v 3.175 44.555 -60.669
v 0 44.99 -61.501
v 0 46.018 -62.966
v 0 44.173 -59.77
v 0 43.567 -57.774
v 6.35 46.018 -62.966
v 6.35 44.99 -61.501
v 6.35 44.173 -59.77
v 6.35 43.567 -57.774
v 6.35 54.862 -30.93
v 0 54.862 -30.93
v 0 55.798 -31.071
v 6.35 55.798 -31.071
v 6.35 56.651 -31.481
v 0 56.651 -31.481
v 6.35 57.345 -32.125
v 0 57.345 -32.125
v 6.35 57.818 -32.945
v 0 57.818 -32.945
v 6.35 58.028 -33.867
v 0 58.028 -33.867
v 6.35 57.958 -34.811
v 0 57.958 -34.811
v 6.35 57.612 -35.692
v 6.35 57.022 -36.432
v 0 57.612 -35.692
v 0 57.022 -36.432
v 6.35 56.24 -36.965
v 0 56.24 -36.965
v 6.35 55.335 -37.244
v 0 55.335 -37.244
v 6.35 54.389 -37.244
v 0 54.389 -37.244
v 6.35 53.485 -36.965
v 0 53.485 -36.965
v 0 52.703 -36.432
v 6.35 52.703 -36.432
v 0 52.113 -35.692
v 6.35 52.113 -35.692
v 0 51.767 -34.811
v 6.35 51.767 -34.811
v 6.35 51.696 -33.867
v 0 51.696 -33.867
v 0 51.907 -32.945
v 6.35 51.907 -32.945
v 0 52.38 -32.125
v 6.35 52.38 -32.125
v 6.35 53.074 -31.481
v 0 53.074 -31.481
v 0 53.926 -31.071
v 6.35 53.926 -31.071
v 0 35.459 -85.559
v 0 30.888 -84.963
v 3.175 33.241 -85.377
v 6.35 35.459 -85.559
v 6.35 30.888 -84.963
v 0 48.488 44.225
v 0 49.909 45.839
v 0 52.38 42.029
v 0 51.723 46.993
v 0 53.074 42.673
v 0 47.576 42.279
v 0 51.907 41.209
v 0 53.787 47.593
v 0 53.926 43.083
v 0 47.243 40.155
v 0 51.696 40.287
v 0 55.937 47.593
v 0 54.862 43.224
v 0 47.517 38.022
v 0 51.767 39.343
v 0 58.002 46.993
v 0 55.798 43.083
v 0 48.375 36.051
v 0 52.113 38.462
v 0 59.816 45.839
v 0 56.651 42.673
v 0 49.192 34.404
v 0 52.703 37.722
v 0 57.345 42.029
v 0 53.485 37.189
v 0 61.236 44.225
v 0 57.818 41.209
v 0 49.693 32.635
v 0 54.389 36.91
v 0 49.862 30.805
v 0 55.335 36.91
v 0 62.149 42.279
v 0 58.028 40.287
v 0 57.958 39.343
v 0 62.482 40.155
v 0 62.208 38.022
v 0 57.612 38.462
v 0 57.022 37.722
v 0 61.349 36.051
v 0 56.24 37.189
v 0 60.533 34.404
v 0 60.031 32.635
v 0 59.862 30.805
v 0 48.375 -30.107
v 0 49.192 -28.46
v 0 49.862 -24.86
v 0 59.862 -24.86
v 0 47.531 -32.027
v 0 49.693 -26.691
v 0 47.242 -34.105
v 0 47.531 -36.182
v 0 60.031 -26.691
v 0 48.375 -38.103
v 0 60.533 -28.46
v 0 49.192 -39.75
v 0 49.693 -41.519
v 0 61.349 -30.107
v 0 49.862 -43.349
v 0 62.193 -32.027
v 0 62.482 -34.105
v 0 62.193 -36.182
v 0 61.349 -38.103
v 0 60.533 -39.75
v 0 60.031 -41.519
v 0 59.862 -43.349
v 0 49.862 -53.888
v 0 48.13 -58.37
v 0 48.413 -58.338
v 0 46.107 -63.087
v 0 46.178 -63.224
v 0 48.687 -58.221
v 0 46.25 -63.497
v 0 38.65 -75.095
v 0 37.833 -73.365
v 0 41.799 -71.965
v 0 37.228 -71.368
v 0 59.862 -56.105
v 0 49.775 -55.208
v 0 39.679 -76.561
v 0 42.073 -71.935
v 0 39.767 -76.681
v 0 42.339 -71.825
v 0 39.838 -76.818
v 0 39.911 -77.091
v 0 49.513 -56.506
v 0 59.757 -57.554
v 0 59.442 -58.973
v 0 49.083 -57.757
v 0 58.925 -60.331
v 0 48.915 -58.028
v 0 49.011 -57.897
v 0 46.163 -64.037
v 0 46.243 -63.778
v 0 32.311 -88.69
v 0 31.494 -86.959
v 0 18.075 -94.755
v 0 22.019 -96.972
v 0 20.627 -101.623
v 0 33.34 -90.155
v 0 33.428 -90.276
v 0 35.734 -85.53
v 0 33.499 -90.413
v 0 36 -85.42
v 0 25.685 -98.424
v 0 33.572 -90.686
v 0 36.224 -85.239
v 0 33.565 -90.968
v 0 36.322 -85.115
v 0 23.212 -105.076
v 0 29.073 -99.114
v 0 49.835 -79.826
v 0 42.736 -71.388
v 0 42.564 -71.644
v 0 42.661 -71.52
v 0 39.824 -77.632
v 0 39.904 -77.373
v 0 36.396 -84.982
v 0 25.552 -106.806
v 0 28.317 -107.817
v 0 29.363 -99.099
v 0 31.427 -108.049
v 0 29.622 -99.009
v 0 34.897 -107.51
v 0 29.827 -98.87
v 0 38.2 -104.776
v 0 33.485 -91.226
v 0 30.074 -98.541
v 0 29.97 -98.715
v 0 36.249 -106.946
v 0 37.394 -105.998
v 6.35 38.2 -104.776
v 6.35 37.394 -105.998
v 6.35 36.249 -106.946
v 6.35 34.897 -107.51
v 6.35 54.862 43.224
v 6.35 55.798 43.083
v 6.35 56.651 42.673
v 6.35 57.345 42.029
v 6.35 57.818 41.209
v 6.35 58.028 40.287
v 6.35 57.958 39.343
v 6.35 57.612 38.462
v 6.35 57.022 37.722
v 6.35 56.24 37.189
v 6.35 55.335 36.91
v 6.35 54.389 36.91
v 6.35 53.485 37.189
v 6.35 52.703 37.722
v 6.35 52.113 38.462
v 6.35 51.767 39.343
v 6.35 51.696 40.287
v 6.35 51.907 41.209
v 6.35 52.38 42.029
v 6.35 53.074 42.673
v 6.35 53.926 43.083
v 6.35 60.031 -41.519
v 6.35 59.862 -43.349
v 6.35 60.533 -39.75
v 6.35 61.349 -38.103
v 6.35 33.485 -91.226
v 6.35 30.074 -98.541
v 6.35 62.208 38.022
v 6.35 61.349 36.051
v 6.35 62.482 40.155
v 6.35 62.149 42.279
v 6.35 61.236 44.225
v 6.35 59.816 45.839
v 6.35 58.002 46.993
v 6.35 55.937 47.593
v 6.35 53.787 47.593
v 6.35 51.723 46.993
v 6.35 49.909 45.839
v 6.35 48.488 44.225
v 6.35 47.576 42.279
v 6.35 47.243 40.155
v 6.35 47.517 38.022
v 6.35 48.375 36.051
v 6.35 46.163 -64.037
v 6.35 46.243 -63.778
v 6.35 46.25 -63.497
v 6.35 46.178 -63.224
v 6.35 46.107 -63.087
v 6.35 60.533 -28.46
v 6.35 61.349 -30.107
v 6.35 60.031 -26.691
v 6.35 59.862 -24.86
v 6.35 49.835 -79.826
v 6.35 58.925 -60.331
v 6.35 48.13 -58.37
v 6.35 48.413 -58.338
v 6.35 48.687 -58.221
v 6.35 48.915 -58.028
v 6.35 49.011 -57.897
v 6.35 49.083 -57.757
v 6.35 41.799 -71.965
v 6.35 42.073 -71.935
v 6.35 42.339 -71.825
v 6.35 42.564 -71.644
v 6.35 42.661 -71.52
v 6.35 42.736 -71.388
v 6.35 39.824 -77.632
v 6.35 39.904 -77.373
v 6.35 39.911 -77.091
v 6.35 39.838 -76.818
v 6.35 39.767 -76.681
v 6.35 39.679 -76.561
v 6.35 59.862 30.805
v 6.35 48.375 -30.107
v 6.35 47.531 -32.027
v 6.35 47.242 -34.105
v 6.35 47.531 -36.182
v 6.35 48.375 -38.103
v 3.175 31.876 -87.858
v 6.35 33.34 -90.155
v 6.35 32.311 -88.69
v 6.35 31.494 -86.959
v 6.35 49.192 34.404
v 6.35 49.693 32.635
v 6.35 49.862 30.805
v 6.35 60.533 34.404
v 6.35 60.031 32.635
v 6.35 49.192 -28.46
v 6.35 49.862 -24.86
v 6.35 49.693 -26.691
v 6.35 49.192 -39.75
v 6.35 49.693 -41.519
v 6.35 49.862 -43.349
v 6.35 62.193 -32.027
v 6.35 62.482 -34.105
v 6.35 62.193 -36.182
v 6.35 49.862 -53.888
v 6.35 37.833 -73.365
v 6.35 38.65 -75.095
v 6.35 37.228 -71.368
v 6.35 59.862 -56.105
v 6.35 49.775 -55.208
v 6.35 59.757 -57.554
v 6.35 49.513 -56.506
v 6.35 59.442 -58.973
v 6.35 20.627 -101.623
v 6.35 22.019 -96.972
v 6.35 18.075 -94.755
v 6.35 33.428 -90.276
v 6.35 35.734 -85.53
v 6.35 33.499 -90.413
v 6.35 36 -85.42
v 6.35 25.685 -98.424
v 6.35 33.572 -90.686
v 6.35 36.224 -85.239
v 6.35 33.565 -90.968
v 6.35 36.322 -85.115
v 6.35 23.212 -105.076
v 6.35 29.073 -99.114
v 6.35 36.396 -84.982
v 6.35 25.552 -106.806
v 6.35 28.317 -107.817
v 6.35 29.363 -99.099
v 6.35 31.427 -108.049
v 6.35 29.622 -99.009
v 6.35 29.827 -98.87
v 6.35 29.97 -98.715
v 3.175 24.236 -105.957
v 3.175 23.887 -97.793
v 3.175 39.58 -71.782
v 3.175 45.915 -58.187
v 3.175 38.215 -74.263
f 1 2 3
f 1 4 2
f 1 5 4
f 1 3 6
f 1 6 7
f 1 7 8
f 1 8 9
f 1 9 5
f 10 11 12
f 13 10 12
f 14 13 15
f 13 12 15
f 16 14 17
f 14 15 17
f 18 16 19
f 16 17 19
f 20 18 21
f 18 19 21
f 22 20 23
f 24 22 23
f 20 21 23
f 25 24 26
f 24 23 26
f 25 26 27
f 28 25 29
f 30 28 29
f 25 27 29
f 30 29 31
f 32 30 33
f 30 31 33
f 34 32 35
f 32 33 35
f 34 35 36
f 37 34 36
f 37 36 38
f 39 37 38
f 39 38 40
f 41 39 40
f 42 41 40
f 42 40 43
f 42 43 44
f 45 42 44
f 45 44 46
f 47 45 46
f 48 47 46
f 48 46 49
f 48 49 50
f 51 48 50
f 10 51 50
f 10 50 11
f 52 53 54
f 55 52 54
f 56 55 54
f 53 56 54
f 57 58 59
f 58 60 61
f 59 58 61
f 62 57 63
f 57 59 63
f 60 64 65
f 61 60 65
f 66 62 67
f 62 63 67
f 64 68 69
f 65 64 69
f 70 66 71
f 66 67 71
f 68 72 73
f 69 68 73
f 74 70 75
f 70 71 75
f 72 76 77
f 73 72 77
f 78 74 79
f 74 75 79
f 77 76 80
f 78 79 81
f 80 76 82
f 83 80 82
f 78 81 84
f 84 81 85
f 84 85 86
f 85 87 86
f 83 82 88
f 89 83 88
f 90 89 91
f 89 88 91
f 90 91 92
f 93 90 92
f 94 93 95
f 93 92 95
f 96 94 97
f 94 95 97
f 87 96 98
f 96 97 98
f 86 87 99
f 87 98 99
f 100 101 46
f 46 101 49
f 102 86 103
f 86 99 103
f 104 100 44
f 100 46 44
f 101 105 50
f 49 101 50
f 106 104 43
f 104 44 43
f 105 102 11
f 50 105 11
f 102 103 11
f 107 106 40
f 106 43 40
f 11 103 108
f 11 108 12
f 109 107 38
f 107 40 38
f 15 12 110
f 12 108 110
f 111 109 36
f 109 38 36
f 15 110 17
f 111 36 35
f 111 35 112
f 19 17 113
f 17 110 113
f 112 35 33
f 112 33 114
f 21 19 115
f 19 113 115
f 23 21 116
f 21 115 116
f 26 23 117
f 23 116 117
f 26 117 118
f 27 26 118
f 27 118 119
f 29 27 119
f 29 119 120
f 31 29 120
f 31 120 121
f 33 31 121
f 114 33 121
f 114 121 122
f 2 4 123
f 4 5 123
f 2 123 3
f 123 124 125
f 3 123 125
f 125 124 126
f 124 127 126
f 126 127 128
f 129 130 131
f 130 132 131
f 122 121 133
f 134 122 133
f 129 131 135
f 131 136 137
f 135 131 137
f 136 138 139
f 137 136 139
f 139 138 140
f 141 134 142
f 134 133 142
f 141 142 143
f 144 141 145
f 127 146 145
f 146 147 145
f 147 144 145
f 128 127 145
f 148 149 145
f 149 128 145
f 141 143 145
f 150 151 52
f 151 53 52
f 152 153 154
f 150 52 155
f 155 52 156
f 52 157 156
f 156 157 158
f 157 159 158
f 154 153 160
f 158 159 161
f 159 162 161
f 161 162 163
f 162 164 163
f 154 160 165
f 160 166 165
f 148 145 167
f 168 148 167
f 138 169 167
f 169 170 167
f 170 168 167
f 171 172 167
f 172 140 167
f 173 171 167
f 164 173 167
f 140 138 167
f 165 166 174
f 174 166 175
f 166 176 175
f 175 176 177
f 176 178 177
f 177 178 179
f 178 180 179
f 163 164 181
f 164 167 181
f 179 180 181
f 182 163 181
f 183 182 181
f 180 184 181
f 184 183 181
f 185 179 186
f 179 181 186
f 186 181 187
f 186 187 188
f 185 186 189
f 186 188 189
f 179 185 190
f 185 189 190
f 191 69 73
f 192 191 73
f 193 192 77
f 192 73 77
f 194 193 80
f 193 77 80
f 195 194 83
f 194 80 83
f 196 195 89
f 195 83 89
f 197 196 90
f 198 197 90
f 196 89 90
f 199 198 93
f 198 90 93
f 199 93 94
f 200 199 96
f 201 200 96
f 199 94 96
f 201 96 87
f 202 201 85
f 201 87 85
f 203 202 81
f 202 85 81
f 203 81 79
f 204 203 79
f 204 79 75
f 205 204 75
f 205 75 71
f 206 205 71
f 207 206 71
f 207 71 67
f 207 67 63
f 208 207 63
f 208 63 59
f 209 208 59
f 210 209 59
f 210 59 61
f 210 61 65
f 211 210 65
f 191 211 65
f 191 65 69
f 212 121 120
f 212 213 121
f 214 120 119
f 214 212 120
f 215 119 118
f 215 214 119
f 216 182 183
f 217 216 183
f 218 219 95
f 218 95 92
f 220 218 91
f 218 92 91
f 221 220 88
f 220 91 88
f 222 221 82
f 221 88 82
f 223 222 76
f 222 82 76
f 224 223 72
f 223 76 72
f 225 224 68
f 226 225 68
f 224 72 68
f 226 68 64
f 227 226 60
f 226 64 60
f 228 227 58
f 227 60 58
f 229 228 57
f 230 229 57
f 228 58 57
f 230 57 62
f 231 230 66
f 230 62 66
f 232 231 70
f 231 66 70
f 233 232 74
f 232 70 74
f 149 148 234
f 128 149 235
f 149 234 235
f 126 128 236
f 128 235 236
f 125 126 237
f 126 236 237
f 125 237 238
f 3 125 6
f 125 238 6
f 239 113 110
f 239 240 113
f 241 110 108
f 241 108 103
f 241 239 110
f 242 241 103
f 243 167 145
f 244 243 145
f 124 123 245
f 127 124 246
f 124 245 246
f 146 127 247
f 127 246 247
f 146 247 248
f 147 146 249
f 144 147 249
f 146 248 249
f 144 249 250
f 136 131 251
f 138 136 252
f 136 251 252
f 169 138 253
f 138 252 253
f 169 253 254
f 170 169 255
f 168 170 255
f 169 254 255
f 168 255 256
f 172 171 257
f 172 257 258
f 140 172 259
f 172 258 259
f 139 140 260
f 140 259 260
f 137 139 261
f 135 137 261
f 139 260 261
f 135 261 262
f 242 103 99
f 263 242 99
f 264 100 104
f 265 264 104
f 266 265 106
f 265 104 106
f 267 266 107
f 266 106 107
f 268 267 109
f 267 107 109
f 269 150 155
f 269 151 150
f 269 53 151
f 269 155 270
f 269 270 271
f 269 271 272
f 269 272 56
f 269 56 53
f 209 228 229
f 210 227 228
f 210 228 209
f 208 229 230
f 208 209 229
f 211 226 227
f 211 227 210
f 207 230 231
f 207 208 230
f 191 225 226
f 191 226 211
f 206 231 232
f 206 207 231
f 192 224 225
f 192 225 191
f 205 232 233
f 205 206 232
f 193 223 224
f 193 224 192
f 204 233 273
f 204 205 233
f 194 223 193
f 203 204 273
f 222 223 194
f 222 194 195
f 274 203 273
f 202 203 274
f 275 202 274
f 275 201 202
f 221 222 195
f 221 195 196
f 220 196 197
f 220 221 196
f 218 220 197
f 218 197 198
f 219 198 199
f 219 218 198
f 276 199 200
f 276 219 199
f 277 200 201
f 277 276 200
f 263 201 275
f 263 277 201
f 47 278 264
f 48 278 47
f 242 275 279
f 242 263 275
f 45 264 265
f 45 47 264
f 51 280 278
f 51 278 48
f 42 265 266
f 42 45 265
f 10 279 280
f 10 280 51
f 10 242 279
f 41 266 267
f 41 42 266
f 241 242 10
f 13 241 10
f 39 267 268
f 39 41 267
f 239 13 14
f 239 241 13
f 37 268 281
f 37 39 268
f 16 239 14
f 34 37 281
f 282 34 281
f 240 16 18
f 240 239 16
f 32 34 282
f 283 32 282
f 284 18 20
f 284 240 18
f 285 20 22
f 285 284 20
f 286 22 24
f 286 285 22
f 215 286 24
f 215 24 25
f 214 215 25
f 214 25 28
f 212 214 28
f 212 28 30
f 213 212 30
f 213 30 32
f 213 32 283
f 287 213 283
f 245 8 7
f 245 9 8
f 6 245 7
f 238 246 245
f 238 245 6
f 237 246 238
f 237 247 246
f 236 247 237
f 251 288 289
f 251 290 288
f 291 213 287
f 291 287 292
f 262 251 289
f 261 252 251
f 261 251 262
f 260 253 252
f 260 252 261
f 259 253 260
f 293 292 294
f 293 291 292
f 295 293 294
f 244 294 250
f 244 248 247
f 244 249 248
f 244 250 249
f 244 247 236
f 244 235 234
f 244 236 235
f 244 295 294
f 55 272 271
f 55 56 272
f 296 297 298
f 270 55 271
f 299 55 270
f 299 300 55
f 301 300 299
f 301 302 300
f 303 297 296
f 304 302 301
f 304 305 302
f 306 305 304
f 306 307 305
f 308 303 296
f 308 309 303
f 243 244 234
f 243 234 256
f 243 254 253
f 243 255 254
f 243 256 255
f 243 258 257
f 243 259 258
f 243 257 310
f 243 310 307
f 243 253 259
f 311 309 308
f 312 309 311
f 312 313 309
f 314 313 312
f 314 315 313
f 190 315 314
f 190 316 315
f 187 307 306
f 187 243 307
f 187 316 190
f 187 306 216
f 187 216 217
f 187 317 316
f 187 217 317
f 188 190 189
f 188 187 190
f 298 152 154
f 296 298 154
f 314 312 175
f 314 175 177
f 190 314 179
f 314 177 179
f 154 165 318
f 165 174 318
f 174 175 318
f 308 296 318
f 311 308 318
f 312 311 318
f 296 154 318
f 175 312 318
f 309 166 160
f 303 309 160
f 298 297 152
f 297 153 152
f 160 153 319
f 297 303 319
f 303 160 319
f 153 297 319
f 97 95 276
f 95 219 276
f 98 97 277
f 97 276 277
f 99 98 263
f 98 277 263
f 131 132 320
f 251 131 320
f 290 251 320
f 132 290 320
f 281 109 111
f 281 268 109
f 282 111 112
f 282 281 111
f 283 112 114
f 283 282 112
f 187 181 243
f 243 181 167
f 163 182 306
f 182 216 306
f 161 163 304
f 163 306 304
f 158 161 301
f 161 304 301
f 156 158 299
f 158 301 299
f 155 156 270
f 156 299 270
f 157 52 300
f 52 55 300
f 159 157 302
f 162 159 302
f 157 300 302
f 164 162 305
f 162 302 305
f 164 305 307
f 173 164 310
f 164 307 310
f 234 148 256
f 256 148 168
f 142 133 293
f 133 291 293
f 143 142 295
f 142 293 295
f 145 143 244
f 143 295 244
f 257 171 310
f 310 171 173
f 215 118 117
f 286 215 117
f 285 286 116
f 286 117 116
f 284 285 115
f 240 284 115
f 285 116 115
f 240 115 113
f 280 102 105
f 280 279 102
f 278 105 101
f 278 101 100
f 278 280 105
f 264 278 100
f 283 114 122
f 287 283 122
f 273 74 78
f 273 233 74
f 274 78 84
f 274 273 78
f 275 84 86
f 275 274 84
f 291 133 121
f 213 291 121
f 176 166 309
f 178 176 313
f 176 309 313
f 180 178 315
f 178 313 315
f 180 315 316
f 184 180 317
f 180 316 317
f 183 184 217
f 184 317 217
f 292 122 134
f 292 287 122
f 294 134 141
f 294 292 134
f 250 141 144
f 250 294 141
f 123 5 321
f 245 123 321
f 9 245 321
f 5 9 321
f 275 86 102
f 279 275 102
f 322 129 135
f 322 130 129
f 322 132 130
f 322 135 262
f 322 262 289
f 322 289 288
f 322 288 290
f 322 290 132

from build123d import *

# Parameters (mm, degrees)
BOSS_EXTRUDE1_DEPTH        = 6.35
F_1_4_0_2500_DOWEL_HOLE4_D = 6.35
FILLET1_R                  = 10
FILLET2_R                  = 10
FILLET4_R                  = 5
FILLET5_R                  = 1
FILLET6_R                  = 10


with BuildPart() as part:
    # Sketch1 → Boss-Extrude1 (new body)
    with BuildSketch(Plane(origin=(0, 0, 0), x_dir=(0, 0, -1), z_dir=(1, 0, 0))):
        with BuildLine():
            ThreePointArc((-34.29915969, 59.86223243), (-47.669324906, 54.86223243), (-34.29915969, 49.86223243))
            Line((-34.29915969, 49.86223243), (28.354545267, 49.86223243))
            ThreePointArc((28.354545267, 49.86223243), (34.104710482, 47.24223243), (39.854875697, 49.86223243))
            Line((39.854875697, 49.86223243), (56.104710487, 49.86223243))
            Line((56.104710487, 49.86223243), (58.379362515, 48.80154477))
            add(Edge.make_bspline(
                [(58.379362515, 48.80154477), (58.386228757, 46.363071997), (57.773854653, 43.567008128)],
                knots=[0, 0, 0, 1, 1, 1], degree=2))
            add(Edge.make_bspline(
                [(63.433148606, 46.444925613), (61.354068213, 44.407555536), (57.773854653, 43.567008128)],
                knots=[0.61808465, 0.61808465, 0.61808465, 1, 1, 1], degree=2))
            Line((63.433148606, 46.444925613), (71.973979321, 42.462270844))
            add(Edge.make_bspline(
                [(71.973979321, 42.462270844), (71.980845562, 40.023798071), (71.368471459, 37.227734202)],
                knots=[0, 0, 0, 1, 1, 1], degree=2))
            add(Edge.make_bspline(
                [(77.027765412, 40.105651687), (74.948685018, 38.06828161), (71.368471459, 37.227734202)],
                knots=[0.61808465, 0.61808465, 0.61808465, 1, 1, 1], degree=2))
            Line((77.027765412, 40.105651687), (85.568596126, 36.122996918))
            add(Edge.make_bspline(
                [(85.568596126, 36.122996918), (85.575462368, 33.684524145), (84.963088264, 30.888460276)],
                knots=[0, 0, 0, 1, 1, 1], degree=2))
            add(Edge.make_bspline(
                [(90.622382217, 33.766377761), (88.543301824, 31.729007684), (84.963088264, 30.888460276)],
                knots=[0.61808465, 0.61808465, 0.61808465, 1, 1, 1], degree=2))
            Line((90.622382217, 33.766377761), (99.163212932, 29.783722992))
            add(Edge.make_bspline(
                [(99.163212932, 29.783722992), (98.939072146, 24.65005498), (94.755179462, 18.075155142)],
                knots=[0, 0, 0, 1, 1, 1], degree=2))
            add(Edge.make_bspline(
                [(94.755179462, 18.075155142), (112.208752339, 22.33534385), (106.773416656, 37.268805905)],
                knots=[0.444949083, 0.444949083, 0.444949083, 1.444949083, 1.444949083, 1.444949083], degree=2))
            Line((106.773416656, 37.268805905), (79.825550101, 49.834802449))
            Line((79.825550101, 49.834802449), (58.321657114, 59.86223243))
            Line((58.321657114, 59.86223243), (39.854875697, 59.86223243))
            ThreePointArc((39.854875697, 59.86223243), (34.104710482, 62.48223243), (28.354545266, 59.86223243))
            Line((28.354545266, 59.86223243), (-34.29915969, 59.86223243))
        make_face()
    extrude(amount=BOSS_EXTRUDE1_DEPTH)

    # 1/4 (0.2500) Dowel Hole4 (through all)
    with Locations(Plane(origin=(6.35, 0, 0), x_dir=(0, 0, -1), z_dir=(1, 0, 0))):
        with Locations((-40.049324906, 54.86223243), (34.104710482, 54.86223243)):
            Hole(F_1_4_0_2500_DOWEL_HOLE4_D / 2)

    # Fillet1
    fillet1_edges = [part.edges().sort_by_distance(p)[0] for p in [
        (3.175, 49.86223243, 34.29915969),
        (3.175, 59.86223243, 34.29915969),
    ]]
    fillet(fillet1_edges, radius=FILLET1_R)

    # Fillet2
    fillet2_edges = [part.edges().sort_by_distance(p)[0] for p in [
        (3.175, 49.86223243, -56.104710487),
        (3.175, 59.86223243, -58.321657114),
    ]]
    fillet(fillet2_edges, radius=FILLET2_R)

    # Fillet4
    fillet4_edges = [part.edges().sort_by_distance(p)[0] for p in [
        (3.175, 37.268805905, -106.773416656),
    ]]
    fillet(fillet4_edges, radius=FILLET4_R)

    # Fillet5
    fillet5_edges = [part.edges().sort_by_distance(p)[0] for p in [
        (3.175, 33.766377761, -90.622382217),
        (3.175, 40.105651687, -77.027765412),
        (3.175, 46.444925613, -63.433148606),
        (3.175, 48.80154477, -58.379362515),
        (3.175, 42.462270844, -71.973979321),
        (3.175, 36.122996918, -85.568596126),
        (3.175, 29.783722992, -99.163212932),
    ]]
    fillet(fillet5_edges, radius=FILLET5_R)

    # Fillet6
    fillet6_edges = [part.edges().sort_by_distance(p)[0] for p in [
        (3.175, 49.86223243, -39.854875697),
        (3.175, 49.86223243, -28.354545267),
        (3.175, 59.86223243, -28.354545266),
        (3.175, 59.86223243, -39.854875697),
    ]]
    fillet(fillet6_edges, radius=FILLET6_R)


solid = part.part
